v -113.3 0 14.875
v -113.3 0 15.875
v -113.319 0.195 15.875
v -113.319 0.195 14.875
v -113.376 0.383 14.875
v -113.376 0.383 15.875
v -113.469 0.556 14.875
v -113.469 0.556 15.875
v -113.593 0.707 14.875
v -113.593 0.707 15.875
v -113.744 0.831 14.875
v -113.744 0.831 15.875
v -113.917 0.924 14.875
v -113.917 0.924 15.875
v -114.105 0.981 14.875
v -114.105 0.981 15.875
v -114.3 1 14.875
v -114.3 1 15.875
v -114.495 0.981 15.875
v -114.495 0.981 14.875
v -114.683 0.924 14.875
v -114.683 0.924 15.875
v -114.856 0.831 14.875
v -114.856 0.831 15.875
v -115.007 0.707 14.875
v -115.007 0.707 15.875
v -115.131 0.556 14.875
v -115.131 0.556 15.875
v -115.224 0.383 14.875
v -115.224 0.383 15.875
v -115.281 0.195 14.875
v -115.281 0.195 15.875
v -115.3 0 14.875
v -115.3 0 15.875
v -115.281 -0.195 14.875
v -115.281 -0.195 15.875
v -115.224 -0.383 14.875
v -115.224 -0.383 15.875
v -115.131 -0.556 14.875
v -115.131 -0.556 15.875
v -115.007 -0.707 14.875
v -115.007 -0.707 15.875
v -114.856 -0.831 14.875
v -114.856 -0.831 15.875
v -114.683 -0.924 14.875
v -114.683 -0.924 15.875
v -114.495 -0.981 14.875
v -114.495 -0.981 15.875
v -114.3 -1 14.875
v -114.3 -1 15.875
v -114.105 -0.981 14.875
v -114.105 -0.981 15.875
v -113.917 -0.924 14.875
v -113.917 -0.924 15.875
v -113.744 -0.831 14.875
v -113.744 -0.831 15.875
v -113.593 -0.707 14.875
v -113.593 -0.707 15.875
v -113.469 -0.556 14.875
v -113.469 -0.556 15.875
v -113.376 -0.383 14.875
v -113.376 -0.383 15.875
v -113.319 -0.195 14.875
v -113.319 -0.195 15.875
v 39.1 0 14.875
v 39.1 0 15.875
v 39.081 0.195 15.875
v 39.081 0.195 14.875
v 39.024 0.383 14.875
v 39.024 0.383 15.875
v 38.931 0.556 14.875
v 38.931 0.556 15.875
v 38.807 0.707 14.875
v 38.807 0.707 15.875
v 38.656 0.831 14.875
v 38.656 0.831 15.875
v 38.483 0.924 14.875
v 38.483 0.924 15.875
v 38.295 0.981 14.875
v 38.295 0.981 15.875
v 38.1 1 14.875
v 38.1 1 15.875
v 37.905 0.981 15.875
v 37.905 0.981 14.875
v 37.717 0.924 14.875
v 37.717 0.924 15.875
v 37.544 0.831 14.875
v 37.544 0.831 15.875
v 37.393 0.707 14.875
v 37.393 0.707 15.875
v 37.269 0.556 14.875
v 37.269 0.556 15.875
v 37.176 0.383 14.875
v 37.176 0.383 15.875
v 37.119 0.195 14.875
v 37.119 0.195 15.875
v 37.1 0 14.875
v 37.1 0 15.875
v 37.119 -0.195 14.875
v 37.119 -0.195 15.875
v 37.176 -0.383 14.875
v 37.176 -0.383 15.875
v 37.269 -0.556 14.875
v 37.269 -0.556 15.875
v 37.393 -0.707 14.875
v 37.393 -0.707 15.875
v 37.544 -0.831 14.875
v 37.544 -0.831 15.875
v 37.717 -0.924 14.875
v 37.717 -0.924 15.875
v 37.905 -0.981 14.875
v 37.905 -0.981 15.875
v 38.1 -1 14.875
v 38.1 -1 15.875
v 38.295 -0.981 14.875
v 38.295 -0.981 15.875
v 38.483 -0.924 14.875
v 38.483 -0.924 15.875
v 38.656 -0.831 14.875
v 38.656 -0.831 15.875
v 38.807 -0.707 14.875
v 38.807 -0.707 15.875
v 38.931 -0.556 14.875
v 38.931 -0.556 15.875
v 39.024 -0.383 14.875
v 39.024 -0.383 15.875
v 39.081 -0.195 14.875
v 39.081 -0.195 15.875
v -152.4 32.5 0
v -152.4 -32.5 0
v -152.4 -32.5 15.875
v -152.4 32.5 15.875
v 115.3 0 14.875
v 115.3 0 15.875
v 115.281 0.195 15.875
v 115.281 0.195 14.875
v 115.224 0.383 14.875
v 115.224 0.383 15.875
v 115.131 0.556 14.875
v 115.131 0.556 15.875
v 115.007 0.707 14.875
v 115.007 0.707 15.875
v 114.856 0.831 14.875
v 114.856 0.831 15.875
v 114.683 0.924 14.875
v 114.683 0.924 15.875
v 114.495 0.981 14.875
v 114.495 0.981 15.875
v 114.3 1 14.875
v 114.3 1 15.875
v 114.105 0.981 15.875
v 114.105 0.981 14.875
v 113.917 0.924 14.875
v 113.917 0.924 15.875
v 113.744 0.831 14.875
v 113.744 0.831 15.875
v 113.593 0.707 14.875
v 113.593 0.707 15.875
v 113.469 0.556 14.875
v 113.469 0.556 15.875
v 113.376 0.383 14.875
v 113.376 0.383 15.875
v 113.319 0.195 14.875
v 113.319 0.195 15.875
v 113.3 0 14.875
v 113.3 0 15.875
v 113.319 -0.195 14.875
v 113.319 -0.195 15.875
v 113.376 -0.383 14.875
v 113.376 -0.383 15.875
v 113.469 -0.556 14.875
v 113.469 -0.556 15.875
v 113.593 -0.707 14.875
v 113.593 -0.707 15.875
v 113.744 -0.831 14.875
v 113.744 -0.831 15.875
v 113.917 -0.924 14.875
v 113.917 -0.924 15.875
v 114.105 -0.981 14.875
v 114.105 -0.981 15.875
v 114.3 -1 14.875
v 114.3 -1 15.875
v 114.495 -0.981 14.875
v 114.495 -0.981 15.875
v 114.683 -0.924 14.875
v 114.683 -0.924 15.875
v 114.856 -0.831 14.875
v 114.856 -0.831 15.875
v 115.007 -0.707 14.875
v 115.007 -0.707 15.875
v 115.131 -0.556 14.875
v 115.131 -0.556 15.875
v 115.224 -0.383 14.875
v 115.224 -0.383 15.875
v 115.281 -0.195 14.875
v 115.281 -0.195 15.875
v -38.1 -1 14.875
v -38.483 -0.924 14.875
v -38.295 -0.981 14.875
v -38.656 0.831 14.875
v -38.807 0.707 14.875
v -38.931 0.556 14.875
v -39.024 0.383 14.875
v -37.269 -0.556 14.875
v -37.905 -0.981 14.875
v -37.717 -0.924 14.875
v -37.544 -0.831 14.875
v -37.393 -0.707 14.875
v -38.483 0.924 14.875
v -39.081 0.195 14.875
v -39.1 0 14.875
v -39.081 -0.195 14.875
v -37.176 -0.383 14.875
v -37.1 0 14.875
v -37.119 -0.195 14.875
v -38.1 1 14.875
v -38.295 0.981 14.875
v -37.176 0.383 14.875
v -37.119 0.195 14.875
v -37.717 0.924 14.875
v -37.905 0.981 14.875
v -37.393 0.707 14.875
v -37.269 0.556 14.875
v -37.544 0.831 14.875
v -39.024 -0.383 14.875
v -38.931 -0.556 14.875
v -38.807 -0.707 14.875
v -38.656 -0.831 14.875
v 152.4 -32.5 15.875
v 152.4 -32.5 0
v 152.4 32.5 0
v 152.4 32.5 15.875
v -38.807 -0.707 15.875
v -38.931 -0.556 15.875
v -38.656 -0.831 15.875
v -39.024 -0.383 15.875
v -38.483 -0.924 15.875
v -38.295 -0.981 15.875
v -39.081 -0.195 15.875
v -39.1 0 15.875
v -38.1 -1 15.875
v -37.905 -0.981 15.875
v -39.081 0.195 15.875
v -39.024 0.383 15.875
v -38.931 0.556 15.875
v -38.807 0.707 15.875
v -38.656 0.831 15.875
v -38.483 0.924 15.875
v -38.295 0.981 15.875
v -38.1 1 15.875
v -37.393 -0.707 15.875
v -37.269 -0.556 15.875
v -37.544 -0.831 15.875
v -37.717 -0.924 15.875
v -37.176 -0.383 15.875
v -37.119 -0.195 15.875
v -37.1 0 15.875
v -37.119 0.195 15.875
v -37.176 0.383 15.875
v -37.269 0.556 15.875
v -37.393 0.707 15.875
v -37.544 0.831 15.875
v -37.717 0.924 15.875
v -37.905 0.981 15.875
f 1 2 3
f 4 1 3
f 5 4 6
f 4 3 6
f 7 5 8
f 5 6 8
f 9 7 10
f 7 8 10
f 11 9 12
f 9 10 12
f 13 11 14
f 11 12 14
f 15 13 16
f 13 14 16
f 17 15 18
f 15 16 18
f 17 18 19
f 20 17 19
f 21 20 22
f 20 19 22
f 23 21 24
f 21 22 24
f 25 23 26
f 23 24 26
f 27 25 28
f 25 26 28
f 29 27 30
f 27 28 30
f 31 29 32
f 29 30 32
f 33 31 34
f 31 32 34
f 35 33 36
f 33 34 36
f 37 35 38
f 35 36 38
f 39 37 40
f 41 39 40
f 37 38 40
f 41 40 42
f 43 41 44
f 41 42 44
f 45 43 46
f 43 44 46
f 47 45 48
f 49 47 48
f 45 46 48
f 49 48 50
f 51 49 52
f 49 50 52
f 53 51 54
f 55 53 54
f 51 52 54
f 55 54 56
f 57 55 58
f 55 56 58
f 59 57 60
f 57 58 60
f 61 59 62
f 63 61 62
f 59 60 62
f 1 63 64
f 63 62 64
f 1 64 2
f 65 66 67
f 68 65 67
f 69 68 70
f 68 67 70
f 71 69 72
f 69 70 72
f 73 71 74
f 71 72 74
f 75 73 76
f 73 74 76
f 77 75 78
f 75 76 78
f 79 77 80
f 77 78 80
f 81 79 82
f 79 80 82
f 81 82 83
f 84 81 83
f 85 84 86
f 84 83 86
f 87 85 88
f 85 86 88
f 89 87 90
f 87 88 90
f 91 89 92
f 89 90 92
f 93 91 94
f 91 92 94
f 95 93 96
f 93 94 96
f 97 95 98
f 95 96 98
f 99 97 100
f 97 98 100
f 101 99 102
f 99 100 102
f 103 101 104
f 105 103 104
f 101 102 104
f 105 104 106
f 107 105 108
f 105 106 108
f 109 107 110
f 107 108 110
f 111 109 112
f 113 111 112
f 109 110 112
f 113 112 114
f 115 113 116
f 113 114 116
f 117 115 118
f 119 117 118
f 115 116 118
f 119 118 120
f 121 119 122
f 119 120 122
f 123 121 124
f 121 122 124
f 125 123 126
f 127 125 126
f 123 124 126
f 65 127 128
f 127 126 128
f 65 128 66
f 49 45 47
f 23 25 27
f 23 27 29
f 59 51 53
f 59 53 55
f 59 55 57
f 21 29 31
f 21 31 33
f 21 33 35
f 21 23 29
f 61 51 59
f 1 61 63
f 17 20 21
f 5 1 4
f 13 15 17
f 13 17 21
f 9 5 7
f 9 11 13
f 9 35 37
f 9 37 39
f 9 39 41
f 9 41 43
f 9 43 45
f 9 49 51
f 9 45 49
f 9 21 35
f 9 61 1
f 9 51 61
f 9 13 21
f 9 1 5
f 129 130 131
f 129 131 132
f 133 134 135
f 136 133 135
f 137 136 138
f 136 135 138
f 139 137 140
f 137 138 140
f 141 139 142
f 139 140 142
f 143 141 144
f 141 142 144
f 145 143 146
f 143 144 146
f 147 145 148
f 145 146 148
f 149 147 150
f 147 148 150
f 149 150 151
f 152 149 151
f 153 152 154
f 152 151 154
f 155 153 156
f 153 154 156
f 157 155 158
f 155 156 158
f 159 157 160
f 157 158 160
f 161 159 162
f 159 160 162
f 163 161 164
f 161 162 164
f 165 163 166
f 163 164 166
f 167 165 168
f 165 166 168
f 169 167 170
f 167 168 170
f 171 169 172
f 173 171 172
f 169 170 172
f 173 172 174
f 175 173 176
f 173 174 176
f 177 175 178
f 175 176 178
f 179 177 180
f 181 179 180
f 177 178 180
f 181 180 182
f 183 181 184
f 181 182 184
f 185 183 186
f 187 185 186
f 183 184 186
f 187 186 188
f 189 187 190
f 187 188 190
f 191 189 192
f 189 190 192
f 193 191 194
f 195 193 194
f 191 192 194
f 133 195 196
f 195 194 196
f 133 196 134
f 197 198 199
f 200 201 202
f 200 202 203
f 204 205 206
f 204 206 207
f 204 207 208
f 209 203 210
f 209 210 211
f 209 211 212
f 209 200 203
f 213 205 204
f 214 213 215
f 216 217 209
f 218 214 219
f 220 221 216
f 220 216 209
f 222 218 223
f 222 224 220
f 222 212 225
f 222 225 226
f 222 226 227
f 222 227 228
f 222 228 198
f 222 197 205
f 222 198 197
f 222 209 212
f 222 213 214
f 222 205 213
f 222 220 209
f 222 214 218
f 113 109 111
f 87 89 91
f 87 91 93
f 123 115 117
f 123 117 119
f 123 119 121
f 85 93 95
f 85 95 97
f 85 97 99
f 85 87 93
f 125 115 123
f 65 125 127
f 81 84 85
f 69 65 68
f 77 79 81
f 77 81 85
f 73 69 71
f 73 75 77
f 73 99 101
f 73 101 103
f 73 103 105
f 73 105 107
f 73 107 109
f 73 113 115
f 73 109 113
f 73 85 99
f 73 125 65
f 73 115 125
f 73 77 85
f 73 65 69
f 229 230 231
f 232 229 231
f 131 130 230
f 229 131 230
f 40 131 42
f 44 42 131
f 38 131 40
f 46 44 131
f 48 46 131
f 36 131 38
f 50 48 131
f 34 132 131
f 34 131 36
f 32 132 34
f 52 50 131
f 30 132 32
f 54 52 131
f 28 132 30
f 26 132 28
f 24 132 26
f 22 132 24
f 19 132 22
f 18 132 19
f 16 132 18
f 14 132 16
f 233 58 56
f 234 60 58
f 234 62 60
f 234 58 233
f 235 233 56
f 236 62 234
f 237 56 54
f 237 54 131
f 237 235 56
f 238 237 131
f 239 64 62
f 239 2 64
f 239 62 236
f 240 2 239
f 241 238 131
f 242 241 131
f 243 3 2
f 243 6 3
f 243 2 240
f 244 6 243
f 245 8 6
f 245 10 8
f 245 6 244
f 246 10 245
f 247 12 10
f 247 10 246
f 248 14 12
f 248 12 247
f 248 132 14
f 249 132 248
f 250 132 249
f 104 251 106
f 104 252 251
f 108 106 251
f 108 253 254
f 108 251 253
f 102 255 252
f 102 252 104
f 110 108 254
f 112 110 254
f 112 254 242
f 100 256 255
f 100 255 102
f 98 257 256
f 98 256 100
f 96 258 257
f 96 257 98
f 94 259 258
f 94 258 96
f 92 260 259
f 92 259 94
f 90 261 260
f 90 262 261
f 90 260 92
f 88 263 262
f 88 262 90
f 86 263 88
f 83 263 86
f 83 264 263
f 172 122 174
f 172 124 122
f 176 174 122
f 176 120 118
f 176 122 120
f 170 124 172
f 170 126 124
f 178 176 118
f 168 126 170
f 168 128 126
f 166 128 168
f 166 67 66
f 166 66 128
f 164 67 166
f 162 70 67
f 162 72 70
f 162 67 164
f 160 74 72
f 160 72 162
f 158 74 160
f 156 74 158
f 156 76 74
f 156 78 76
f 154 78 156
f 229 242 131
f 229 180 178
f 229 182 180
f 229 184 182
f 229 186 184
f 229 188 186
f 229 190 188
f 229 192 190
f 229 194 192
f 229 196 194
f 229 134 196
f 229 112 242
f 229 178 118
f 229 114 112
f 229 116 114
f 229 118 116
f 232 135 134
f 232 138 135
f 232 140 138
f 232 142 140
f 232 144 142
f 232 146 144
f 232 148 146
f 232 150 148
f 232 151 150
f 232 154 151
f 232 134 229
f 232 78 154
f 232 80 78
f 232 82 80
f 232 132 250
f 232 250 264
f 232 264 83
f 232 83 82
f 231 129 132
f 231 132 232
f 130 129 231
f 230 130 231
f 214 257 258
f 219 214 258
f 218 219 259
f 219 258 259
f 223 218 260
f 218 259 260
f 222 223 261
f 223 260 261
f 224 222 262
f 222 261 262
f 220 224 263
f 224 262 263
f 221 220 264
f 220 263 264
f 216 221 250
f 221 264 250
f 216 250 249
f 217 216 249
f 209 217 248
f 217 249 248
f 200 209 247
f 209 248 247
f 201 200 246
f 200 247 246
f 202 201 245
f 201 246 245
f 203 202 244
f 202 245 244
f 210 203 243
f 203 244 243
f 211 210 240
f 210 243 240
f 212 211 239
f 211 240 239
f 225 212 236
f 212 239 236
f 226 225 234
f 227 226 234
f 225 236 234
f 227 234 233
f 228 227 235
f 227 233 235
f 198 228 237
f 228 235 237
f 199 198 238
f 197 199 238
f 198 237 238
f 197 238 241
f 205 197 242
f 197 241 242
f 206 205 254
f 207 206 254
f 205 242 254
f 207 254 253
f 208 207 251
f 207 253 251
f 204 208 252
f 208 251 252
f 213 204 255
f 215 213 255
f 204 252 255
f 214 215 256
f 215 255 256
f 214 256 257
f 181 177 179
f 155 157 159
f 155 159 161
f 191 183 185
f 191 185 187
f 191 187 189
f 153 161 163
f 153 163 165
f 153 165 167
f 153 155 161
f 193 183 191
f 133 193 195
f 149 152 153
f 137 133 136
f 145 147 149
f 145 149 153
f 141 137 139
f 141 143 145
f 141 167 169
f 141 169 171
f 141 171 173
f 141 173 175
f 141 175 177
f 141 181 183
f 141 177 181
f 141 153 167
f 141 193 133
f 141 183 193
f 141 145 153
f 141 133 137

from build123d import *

# Parameters (mm, degrees)
SKETCH1_W               = 304.8
SKETCH1_H               = 65
BOSS_EXTRUDE1_DEPTH     = 15.875
SKETCH2_R               = 1
CUT_EXTRUDE1_DEPTH      = 1
CUT_EXTRUDE1_DEPTH_BACK = 1


with BuildPart() as part:
    # Sketch1 → Boss-Extrude1 (new body)
    with BuildSketch(Plane.XY):
        Rectangle(SKETCH1_W, SKETCH1_H)
    extrude(amount=BOSS_EXTRUDE1_DEPTH)

    # Sketch2 → Cut-Extrude1 (cut, two sides)
    with BuildSketch(Plane.XY.offset(15.875)) as cut_extrude1_sk:
        with Locations((-38.1, 0)):
            Circle(SKETCH2_R)
        with Locations((-114.3, 0)):
            Circle(SKETCH2_R)
        with Locations((114.3, 0)):
            Circle(SKETCH2_R)
        with Locations((38.1, 0)):
            Circle(SKETCH2_R)
    extrude(amount=CUT_EXTRUDE1_DEPTH, mode=Mode.SUBTRACT)
    extrude(cut_extrude1_sk.sketch, amount=-CUT_EXTRUDE1_DEPTH_BACK, mode=Mode.SUBTRACT)


solid = part.part
